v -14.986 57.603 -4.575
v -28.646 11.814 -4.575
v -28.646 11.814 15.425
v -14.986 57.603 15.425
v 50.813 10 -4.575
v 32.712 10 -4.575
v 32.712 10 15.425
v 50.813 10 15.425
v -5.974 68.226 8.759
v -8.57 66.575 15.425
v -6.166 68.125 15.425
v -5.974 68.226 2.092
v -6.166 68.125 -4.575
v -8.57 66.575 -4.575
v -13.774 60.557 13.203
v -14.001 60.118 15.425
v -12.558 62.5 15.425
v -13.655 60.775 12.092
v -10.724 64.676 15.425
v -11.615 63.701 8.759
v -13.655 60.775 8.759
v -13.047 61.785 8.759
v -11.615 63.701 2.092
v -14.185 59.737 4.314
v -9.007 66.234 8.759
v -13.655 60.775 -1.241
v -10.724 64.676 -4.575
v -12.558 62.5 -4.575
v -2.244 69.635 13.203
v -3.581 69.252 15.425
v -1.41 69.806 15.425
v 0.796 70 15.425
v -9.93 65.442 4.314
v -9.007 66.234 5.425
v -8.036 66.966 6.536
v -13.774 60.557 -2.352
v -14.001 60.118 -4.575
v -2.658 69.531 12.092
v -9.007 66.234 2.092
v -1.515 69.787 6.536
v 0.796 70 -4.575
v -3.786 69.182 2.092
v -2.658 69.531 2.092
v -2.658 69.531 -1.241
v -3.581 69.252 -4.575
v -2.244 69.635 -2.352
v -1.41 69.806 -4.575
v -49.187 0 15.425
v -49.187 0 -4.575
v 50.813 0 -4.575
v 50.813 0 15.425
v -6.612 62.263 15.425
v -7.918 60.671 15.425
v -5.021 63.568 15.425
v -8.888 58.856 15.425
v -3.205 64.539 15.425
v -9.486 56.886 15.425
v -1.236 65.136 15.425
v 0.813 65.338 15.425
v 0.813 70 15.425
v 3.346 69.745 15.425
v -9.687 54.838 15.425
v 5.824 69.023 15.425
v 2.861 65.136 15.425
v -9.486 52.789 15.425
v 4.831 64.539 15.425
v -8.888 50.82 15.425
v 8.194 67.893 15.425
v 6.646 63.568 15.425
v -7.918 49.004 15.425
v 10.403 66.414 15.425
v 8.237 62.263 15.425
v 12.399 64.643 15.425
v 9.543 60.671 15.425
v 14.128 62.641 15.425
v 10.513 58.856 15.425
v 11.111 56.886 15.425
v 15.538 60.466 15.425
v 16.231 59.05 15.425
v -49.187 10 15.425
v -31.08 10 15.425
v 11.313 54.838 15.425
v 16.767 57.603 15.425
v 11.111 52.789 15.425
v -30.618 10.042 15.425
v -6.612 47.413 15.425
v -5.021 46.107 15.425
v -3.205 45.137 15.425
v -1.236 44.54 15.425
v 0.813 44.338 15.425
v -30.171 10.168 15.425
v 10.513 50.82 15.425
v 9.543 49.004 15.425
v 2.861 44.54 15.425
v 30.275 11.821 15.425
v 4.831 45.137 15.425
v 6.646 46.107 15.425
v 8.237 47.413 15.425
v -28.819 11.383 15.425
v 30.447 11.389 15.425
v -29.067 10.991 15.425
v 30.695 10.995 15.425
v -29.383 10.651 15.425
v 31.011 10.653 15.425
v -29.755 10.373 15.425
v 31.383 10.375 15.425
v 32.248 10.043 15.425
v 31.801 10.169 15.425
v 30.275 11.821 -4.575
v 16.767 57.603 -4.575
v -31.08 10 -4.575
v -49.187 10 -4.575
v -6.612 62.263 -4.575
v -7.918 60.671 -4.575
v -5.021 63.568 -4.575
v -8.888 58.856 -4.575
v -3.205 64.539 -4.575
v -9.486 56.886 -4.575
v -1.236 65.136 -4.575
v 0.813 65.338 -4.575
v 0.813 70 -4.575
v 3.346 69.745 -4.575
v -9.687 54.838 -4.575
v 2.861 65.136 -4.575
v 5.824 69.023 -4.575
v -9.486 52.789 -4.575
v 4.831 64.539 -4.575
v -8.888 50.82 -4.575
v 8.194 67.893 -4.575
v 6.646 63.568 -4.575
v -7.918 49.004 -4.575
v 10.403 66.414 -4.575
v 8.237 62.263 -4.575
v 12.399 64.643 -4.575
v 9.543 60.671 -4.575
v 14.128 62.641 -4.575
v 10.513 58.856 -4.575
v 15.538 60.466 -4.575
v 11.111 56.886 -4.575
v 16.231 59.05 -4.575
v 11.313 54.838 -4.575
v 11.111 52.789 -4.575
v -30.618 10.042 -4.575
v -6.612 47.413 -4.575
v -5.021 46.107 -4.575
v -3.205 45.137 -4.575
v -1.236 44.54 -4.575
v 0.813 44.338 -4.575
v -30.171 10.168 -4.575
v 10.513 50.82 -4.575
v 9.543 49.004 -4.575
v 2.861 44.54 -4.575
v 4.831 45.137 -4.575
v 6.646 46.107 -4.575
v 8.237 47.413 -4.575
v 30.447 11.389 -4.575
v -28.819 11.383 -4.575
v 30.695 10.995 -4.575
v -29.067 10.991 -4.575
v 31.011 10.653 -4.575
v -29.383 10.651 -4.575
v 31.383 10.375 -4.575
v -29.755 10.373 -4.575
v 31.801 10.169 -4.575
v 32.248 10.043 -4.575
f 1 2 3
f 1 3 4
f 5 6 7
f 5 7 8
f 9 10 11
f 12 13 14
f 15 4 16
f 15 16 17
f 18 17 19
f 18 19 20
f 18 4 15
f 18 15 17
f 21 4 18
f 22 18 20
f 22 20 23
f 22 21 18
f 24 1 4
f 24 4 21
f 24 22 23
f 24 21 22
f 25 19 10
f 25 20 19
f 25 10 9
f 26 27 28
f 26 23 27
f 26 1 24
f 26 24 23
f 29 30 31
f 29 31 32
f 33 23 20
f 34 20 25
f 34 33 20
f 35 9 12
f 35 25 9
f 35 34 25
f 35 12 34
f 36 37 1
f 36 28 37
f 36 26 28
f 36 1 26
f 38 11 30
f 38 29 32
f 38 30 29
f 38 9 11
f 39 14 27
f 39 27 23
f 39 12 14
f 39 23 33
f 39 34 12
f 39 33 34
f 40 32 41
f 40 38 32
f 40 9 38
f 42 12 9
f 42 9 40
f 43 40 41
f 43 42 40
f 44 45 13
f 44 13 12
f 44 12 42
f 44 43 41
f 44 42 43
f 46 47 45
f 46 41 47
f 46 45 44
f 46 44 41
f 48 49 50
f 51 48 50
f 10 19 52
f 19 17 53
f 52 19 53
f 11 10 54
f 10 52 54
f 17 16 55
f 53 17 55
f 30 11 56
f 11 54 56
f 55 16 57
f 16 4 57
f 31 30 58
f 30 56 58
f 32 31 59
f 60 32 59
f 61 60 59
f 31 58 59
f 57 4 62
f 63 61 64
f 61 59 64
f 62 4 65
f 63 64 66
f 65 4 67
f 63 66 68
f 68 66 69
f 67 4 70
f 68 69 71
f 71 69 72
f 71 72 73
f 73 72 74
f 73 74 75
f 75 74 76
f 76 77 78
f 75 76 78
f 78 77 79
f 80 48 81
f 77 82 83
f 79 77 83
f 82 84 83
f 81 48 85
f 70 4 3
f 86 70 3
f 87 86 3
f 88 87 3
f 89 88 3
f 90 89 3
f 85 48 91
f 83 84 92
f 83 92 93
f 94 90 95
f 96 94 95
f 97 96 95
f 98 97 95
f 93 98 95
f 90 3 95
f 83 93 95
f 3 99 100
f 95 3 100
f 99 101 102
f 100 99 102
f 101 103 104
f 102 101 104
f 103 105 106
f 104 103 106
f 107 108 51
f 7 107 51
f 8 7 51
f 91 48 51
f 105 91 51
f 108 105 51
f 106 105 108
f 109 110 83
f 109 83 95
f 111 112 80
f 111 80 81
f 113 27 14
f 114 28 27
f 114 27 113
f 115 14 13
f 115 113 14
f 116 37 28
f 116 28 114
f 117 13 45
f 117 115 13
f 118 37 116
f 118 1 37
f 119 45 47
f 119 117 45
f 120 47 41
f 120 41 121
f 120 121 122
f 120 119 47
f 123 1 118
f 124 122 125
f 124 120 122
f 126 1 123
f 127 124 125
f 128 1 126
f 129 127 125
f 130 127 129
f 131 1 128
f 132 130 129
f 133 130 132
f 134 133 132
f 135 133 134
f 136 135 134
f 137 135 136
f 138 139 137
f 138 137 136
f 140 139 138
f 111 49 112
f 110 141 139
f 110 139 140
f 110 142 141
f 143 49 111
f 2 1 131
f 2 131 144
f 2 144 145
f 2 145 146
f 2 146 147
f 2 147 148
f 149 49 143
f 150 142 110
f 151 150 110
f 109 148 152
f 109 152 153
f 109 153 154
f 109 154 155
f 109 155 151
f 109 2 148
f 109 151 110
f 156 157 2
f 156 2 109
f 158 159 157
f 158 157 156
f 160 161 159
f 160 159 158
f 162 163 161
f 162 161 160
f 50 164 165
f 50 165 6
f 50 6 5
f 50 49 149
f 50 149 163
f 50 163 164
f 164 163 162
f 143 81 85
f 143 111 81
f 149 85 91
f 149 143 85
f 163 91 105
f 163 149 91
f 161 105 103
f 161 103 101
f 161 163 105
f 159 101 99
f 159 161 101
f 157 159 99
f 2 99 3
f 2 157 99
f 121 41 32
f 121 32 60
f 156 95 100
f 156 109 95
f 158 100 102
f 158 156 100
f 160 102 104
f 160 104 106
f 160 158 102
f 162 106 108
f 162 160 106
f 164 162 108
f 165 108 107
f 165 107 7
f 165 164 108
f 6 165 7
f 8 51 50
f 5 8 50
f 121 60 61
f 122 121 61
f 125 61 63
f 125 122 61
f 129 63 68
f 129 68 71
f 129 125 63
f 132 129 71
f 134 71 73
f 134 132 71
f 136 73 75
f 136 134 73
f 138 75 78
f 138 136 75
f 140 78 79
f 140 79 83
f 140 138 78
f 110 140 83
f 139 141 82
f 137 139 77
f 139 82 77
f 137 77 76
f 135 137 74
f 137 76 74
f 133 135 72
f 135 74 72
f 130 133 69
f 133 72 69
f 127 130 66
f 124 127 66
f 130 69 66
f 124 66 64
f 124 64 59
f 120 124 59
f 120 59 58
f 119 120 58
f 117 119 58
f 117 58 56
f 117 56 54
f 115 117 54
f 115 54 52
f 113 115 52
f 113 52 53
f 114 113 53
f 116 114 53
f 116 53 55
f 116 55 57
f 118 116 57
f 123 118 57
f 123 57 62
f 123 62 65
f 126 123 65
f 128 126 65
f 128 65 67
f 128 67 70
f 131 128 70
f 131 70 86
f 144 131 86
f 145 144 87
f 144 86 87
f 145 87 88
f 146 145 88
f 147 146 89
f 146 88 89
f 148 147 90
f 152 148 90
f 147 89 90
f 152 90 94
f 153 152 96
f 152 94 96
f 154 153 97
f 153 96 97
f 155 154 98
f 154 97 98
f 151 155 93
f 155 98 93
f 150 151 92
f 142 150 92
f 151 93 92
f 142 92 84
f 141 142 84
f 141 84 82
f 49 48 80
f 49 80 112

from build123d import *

# Parameters (mm, degrees)
SKETCH1_W           = 100
SKETCH1_H           = 20
BOSS_EXTRUDE1_DEPTH = 10
SKETCH2_W           = 60
SKETCH2_H           = 20
BOSS_EXTRUDE2_DEPTH = 60
SKETCH3_R           = 10.5
CUT_EXTRUDE1_DEPTH  = 60
CUT_EXTRUDE2_START  = -20
CUT_EXTRUDE2_DEPTH  = 20
FILLET1_R           = 2.54
FILLET2_R           = 2.54


# Read off the part's stored shape, not the designer's step: Cut-Extrude2
with BuildPart() as part:
    # Sketch1 → Boss-Extrude1 (new body)
    with BuildSketch(Plane(origin=(0, 0, 0), x_dir=(1, 0, 0), z_dir=(0, 1, 0))):
        with Locations((0.812697448, -5.425302539)):
            Rectangle(SKETCH1_W, SKETCH1_H)
    extrude(amount=BOSS_EXTRUDE1_DEPTH)

    # Sketch2 → Boss-Extrude2 (add)
    with BuildSketch(Plane(origin=(0, 10, 0), x_dir=(1, 0, 0), z_dir=(0, 1, 0))):
        with Locations((0.812697448, -5.425302539)):
            Rectangle(SKETCH2_W, SKETCH2_H)
    extrude(amount=BOSS_EXTRUDE2_DEPTH)

    # Sketch3 → Cut-Extrude1 (cut)
    with BuildSketch(Plane.XY.offset(15.425302539)):
        with Locations((0.812697448, 54.837920596)):
            Circle(SKETCH3_R)
    extrude(amount=-CUT_EXTRUDE1_DEPTH, mode=Mode.SUBTRACT)

    # Cut-Extrude2 outline → Cut-Extrude2 (cut)
    with BuildSketch(Plane.XY.offset(15.425302539).offset(CUT_EXTRUDE2_START)):
        with BuildLine():
            Line((-29.187302552, 10), (-14.985674084, 57.602633157))
            add(Edge.make_bspline(
                [(-14.985674084, 57.602633157), (-13.129301822, 64.096984003), (-6.152391174, 70.000002699), (0.804550116, 70.000002699)],
                knots=[0, 0, 0, 0, 0.498740566, 0.498740566, 0.498740566, 0.498740566], degree=3))
            Line((0.804550116, 70.000002699), (-29.187302552, 70))
            Line((-29.187302552, 70), (-29.187302552, 10))
        make_face()
        with BuildLine():
            Line((30.812697448, 70), (0.80589599, 70.000002625))
            add(Edge.make_bspline(
                [(0.80589599, 70.000002625), (0.808163145, 70.000002377), (7.799782278, 69.997303833), (14.769205665, 64.030481045), (16.767488499, 57.602633157)],
                knots=[0.498772728, 0.498772728, 0.498772728, 0.498772728, 0.49893526, 1, 1, 1, 1], degree=3))
            Line((16.767488499, 57.602633157), (30.812697448, 10))
            Line((30.812697448, 10), (30.812697448, 70))
        make_face()
    extrude(amount=CUT_EXTRUDE2_DEPTH, mode=Mode.SUBTRACT)

    # Fillet1
    fillet1_edges = [part.edges().sort_by_distance(p)[0] for p in [
        (-29.187302552, 10, 5.425302539),
    ]]
    fillet(fillet1_edges, radius=FILLET1_R)

    # Fillet2
    fillet2_edges = [part.edges().sort_by_distance(p)[0] for p in [
        (30.812697448, 10, 5.425302539),
    ]]
    fillet(fillet2_edges, radius=FILLET2_R)


solid = part.part
